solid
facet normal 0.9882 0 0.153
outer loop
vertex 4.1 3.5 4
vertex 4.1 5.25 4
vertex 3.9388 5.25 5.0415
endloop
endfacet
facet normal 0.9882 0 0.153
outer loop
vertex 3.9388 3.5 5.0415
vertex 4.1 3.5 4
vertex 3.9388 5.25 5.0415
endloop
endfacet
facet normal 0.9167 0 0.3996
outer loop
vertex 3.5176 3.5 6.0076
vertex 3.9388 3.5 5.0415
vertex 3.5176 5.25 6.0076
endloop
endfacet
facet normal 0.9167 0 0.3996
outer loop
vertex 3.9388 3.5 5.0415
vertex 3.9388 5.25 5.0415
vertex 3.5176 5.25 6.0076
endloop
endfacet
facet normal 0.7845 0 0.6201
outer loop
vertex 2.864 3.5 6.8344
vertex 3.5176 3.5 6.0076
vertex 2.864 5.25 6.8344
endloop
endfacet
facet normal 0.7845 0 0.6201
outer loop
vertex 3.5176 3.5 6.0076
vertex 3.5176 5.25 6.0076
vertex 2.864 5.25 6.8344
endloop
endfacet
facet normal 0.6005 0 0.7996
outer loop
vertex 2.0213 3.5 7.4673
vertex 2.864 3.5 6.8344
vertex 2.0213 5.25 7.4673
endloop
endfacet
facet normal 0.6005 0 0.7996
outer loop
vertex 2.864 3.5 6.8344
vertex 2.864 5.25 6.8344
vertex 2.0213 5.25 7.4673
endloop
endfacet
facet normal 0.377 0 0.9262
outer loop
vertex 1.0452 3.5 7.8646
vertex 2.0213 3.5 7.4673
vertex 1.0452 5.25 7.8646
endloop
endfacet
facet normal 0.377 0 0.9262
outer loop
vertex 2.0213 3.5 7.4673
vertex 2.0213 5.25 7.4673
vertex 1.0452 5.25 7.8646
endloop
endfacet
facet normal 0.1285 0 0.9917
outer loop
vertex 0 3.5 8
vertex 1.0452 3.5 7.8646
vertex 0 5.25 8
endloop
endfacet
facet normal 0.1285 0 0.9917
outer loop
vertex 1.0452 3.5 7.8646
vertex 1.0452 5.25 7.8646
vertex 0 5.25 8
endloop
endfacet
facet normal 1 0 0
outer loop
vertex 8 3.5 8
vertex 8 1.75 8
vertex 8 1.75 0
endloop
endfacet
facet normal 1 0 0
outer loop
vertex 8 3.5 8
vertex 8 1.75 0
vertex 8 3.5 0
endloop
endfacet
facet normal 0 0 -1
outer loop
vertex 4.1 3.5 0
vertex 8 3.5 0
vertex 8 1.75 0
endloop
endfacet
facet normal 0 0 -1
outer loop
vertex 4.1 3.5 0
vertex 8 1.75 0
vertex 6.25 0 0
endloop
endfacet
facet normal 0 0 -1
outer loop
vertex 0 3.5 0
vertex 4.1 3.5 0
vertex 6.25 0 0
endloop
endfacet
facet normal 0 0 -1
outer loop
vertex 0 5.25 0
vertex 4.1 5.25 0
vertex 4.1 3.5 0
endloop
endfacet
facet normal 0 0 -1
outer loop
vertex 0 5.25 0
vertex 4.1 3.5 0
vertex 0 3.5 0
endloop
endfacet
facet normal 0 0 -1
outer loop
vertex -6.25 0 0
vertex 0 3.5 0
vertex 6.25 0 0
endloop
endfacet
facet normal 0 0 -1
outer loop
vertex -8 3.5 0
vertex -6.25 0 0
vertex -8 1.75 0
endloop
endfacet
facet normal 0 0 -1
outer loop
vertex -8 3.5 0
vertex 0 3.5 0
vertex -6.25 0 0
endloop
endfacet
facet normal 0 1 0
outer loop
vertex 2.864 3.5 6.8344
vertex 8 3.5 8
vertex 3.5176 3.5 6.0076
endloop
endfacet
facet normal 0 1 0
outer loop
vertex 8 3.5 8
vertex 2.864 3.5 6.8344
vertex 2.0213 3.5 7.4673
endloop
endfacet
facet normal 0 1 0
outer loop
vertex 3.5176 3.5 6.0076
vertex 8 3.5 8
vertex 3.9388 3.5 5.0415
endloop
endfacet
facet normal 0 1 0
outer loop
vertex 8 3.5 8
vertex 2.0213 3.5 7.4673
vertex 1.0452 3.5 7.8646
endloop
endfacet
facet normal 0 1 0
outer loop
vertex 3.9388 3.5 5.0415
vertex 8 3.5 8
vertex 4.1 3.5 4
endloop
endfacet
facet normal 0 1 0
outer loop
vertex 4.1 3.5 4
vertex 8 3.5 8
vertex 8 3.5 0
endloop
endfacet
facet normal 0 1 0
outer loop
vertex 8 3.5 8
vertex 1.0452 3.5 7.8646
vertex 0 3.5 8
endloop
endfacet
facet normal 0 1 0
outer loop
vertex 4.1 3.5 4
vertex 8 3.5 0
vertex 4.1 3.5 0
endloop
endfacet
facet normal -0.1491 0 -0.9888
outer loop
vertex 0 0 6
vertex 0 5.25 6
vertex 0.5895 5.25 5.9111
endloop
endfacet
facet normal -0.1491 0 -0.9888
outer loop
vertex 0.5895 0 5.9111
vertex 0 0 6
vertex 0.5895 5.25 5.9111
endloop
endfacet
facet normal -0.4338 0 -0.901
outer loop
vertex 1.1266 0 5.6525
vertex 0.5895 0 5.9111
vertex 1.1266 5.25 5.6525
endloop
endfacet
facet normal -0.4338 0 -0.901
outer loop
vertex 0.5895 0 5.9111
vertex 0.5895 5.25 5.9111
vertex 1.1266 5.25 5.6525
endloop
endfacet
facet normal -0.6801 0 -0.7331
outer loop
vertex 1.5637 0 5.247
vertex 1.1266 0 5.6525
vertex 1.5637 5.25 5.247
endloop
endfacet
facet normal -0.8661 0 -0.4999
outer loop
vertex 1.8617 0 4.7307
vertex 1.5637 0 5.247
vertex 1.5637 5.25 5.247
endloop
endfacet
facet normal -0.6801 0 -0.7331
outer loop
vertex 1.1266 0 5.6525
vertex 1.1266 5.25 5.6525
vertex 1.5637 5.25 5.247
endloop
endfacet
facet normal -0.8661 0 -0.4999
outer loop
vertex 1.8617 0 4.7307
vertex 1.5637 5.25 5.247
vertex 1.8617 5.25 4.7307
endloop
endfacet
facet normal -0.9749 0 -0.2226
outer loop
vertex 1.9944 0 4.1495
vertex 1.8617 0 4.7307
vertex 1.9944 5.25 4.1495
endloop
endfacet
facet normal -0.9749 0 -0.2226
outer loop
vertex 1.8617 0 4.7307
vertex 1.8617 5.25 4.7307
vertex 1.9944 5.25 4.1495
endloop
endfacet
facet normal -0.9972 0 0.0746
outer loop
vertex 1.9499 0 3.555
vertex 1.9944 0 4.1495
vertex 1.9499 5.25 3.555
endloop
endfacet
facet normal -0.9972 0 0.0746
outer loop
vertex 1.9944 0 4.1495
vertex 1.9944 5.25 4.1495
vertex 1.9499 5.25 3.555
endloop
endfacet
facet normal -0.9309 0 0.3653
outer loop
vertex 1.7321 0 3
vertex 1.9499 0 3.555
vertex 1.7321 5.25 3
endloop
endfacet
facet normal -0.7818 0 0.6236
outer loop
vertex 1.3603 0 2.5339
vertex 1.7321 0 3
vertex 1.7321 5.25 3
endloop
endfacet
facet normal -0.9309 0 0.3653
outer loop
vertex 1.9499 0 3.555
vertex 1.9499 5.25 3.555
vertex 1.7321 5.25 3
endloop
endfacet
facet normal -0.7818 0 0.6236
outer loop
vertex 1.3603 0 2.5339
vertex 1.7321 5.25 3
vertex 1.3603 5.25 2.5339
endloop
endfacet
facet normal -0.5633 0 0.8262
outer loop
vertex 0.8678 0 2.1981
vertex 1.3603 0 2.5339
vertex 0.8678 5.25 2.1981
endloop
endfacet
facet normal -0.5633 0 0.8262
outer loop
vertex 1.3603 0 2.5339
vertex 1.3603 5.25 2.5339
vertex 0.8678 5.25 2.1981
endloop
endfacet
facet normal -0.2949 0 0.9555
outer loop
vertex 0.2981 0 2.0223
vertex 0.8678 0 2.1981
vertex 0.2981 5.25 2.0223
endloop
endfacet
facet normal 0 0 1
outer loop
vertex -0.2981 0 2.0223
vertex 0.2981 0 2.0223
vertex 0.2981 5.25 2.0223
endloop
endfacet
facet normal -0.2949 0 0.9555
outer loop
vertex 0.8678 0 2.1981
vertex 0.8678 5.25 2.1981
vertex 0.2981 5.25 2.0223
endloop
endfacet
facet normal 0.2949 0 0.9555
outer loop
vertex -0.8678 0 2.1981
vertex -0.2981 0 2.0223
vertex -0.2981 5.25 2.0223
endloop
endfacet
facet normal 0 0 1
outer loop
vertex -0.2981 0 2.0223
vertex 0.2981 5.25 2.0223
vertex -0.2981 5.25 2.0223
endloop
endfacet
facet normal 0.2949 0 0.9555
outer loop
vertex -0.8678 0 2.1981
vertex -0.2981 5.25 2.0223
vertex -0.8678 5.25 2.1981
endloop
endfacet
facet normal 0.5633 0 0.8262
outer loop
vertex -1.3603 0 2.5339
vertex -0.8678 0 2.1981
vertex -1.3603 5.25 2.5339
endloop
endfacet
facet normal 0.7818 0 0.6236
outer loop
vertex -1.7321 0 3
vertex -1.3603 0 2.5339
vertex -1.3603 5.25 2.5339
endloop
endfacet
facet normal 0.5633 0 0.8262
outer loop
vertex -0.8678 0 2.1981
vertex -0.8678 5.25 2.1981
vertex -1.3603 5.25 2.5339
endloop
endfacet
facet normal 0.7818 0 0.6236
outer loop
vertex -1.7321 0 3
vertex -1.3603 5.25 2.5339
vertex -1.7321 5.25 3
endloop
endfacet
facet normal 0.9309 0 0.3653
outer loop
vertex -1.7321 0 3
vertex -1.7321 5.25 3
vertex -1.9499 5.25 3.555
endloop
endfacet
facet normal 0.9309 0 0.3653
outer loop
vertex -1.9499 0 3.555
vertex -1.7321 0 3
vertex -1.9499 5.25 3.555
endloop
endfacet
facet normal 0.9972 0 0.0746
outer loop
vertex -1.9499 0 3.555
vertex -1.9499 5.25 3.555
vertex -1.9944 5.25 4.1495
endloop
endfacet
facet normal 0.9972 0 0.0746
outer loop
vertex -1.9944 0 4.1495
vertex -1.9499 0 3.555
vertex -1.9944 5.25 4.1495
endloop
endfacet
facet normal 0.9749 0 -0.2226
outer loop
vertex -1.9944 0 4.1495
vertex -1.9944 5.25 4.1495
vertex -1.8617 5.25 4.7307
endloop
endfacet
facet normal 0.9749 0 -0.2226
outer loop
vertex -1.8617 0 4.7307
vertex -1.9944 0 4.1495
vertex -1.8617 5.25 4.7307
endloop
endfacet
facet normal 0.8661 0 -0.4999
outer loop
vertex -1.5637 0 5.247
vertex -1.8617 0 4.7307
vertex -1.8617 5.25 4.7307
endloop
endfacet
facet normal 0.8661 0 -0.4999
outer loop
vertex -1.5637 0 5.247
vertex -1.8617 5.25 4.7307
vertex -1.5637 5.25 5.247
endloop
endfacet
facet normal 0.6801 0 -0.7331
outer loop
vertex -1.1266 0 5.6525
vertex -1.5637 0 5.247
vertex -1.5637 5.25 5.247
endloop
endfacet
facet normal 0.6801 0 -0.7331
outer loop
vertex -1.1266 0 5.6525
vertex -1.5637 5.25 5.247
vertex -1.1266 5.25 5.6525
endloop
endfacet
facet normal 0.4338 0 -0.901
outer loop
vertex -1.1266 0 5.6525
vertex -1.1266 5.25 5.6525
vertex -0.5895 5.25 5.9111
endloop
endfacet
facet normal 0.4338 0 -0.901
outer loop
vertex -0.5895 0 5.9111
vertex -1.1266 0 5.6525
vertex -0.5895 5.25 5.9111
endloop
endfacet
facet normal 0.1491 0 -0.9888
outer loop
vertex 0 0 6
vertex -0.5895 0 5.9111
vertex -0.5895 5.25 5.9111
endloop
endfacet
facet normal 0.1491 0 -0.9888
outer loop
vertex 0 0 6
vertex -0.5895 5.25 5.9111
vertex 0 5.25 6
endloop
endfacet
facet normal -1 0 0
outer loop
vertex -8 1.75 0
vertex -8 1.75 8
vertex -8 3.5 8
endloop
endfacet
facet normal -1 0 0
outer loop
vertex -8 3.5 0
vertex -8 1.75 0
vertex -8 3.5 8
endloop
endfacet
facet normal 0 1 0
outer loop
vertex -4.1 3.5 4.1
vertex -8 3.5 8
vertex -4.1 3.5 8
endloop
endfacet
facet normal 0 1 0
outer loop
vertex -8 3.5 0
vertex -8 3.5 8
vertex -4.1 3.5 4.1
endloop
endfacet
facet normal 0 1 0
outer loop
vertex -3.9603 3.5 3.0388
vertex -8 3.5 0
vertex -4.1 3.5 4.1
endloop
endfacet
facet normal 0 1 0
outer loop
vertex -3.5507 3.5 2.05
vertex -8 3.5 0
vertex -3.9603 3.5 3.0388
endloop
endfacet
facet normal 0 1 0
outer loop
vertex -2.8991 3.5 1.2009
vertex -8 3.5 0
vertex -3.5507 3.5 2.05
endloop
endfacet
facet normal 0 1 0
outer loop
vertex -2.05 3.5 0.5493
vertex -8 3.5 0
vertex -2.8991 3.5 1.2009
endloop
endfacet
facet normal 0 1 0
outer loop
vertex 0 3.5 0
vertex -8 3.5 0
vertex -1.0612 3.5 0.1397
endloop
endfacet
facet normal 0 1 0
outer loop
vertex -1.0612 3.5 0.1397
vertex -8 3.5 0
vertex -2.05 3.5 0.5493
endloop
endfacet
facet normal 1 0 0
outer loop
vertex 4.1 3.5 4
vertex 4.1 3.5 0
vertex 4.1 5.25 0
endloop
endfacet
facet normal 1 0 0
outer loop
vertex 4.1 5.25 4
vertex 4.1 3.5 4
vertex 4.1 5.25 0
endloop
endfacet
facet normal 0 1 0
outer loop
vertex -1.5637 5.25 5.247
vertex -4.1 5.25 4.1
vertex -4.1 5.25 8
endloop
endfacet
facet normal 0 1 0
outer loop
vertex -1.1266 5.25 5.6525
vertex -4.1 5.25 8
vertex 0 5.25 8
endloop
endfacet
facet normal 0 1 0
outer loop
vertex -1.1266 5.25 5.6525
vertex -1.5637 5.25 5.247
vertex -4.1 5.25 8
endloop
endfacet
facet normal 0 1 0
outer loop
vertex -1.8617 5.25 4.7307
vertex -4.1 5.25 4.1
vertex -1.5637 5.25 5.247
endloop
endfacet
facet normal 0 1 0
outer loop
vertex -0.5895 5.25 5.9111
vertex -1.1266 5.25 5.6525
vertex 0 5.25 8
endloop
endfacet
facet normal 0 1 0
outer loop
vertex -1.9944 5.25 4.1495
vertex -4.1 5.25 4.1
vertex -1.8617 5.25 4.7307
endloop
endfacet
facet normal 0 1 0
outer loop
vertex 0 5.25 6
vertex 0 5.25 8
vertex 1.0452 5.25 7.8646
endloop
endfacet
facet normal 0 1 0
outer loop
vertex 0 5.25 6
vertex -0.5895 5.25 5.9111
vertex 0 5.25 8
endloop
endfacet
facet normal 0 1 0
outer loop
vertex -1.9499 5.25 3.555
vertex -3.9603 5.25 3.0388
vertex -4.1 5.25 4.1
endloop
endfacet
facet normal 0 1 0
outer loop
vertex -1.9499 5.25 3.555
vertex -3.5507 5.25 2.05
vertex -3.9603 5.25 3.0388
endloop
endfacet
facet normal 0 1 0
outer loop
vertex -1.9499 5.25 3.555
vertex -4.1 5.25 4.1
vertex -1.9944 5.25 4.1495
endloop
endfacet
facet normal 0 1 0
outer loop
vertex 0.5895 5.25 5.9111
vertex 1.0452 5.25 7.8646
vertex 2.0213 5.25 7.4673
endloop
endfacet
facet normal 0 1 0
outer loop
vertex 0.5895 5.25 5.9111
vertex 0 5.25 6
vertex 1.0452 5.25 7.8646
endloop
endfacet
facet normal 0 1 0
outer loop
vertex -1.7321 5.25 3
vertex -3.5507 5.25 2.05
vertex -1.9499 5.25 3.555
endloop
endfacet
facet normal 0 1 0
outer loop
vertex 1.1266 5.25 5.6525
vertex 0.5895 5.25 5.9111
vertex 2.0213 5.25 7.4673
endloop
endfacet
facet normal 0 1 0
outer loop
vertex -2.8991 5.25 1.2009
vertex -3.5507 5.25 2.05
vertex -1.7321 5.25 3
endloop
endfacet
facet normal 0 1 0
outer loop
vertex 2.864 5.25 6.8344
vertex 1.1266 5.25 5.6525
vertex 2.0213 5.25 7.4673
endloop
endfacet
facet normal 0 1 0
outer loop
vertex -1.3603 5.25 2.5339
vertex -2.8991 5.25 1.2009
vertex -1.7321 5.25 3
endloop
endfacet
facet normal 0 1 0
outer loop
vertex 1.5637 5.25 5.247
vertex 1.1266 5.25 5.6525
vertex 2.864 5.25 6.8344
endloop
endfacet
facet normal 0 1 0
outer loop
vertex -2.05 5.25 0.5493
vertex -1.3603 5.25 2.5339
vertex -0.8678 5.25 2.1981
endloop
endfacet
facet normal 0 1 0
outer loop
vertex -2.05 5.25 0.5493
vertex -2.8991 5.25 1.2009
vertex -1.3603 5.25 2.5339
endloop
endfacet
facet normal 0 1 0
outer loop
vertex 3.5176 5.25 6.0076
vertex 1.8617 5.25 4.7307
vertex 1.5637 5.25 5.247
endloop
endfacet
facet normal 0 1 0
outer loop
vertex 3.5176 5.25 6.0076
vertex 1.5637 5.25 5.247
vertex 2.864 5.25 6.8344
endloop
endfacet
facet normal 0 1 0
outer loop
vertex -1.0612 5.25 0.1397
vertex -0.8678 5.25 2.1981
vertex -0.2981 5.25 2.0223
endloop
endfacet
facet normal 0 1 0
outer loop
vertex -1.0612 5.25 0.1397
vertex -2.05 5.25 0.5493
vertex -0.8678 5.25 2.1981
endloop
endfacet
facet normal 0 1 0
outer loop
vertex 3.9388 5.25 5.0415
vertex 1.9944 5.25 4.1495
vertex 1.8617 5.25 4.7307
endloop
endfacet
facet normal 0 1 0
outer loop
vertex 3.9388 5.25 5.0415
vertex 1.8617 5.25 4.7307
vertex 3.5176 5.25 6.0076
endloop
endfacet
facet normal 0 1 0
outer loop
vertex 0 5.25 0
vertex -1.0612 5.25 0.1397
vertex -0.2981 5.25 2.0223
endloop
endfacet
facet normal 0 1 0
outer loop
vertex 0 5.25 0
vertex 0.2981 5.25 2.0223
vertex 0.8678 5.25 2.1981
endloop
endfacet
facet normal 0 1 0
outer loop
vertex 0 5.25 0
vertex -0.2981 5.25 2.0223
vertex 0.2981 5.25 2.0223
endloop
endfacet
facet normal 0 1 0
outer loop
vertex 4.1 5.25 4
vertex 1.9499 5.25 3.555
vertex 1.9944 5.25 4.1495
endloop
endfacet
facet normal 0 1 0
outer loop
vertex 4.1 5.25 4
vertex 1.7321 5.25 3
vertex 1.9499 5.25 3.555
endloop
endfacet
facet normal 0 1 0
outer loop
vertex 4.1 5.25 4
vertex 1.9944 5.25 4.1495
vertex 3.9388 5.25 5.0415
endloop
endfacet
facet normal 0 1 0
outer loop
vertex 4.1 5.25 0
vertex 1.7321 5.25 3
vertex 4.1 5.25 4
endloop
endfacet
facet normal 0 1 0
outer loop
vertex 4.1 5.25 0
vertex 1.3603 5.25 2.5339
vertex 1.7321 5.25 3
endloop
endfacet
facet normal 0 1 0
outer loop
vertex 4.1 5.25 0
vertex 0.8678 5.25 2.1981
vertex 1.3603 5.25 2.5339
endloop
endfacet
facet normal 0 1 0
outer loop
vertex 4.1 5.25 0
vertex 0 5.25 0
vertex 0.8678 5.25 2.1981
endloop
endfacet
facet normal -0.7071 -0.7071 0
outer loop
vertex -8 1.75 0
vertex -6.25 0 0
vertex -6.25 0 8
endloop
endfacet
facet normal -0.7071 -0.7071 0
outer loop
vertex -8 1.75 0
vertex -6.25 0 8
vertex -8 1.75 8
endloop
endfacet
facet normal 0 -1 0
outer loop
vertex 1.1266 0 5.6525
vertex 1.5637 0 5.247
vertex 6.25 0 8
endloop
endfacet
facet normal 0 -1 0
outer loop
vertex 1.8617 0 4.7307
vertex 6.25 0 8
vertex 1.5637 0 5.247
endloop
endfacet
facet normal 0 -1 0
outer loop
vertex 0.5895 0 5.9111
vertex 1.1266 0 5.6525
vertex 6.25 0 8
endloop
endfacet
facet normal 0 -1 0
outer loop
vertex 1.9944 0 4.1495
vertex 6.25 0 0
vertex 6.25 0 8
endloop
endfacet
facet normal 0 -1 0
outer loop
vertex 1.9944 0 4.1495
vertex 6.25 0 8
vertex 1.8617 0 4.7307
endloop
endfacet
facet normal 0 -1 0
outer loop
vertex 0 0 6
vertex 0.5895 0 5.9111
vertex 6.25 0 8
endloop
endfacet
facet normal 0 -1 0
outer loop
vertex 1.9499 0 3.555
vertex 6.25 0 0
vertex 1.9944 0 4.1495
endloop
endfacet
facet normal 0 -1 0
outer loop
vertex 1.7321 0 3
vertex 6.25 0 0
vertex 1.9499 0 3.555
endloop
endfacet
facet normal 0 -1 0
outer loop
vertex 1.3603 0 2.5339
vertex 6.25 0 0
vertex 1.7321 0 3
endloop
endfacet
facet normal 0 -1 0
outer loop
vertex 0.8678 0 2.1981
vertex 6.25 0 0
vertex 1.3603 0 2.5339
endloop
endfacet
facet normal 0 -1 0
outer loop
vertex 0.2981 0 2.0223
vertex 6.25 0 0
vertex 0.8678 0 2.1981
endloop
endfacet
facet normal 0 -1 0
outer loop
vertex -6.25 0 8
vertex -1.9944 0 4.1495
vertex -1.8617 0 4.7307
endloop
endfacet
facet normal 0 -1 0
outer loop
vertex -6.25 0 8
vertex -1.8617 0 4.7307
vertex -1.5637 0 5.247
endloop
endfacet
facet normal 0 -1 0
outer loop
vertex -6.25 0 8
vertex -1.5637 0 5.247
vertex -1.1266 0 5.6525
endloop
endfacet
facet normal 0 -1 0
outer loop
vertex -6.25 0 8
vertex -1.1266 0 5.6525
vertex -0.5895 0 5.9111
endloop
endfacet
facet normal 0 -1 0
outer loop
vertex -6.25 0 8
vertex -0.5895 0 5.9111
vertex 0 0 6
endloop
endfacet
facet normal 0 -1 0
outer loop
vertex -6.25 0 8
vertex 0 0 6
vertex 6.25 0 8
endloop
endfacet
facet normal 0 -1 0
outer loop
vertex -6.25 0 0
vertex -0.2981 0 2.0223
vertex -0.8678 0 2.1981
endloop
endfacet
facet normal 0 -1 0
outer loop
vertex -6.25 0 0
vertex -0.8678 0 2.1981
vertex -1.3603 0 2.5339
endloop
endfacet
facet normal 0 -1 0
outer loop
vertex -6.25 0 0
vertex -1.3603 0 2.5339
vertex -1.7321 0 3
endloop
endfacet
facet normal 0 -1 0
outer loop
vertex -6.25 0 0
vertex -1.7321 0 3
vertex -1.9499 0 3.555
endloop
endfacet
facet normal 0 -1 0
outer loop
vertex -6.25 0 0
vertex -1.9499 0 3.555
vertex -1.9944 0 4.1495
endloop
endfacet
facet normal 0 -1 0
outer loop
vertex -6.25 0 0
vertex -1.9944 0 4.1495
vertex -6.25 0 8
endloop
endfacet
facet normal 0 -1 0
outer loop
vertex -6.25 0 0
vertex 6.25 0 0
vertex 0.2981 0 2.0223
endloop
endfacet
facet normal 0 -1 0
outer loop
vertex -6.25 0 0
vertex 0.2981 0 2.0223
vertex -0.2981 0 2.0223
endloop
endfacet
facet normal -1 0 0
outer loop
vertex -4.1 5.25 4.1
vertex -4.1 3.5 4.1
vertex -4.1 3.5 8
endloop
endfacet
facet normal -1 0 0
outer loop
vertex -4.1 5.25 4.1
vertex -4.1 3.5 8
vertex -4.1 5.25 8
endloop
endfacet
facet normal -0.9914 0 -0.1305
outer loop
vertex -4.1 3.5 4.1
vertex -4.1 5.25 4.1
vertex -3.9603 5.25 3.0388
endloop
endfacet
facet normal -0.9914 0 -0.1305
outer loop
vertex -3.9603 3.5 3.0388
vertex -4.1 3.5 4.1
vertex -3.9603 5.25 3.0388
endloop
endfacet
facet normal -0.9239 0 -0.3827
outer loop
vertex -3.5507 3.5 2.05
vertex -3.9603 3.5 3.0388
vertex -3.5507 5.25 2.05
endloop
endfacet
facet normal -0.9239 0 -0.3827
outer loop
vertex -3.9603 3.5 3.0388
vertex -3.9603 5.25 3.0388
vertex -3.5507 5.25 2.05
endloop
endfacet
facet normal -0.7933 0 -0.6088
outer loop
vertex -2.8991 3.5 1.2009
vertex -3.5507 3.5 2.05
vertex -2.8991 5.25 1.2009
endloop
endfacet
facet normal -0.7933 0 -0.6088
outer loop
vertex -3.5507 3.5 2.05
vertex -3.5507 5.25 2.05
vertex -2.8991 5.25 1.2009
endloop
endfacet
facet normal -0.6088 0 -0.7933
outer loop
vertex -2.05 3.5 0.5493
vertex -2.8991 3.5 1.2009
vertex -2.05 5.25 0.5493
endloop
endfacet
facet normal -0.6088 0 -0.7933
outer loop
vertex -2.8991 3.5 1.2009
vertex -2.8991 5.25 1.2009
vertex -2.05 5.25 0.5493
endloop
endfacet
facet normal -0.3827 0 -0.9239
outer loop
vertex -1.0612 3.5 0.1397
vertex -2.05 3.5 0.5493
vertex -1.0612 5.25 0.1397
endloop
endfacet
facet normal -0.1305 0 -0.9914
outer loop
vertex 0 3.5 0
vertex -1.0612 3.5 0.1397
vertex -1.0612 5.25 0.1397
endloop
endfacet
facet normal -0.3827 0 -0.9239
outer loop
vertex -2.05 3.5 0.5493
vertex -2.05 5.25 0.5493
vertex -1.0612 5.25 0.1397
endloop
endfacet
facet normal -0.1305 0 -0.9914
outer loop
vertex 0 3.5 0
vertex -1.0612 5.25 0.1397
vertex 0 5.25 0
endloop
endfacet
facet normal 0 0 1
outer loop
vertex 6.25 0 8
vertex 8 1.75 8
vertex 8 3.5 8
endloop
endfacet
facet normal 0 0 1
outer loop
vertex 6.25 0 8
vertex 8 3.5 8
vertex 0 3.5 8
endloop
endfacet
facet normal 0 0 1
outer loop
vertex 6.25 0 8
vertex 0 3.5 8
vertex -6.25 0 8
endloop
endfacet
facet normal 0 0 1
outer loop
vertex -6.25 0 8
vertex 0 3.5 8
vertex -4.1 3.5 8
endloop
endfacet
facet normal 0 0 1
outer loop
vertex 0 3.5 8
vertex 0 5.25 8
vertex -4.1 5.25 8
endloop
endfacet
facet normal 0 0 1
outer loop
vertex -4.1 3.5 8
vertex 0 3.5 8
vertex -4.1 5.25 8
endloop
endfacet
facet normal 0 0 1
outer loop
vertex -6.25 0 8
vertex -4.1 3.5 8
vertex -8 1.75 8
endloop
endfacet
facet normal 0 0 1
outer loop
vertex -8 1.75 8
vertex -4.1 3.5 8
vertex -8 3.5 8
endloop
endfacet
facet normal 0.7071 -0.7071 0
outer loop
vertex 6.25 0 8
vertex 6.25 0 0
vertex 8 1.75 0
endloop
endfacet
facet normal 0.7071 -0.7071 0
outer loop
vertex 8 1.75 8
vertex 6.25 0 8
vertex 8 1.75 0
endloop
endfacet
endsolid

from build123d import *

# Parameters (mm, degrees)
BOSS_EXTRUDE1_DEPTH = 8
SKETCH2_R           = 2
CUT_EXTRUDE1_DEPTH  = 8
CUT_EXTRUDE2_DEPTH  = 1.75


with BuildPart() as part:
    # Sketch1 → Boss-Extrude1 (new body)
    with BuildSketch(Plane.XY):
        Polygon((0, 5.25), (0, 0), (6.25, 0), (8, 1.75), (8, 3.5), (4.1, 3.5), (4.1, 5.25), align=None)
    extrude(amount=BOSS_EXTRUDE1_DEPTH)

    # Mirror1: part across plane


with BuildPart() as part_1:
    add(part.part)
    add(part.part.mirror(Plane(origin=(0, 0, 0), x_dir=(0, 0, 1), z_dir=(1, 0, 0))))

    # Sketch2 → Cut-Extrude1 (cut)
    with BuildSketch(Plane(origin=(0, 5.25, 0), x_dir=(1, 0, 0), z_dir=(0, 1, 0))):
        with Locations(Location((0, -4, 0), (0, 0, 270))):
            Circle(SKETCH2_R)
    extrude(amount=-CUT_EXTRUDE1_DEPTH, mode=Mode.SUBTRACT)

    # Sketch3 → Cut-Extrude2 (cut)
    with BuildSketch(Plane(origin=(0, 5.25, 0), x_dir=(1, 0, 0), z_dir=(0, 1, 0))):
        with BuildLine():
            ThreePointArc((4.1, -4), (2.864000698, -6.834350716), (0, -8))
            Line((0, -8), (4.1, -8))
            Line((4.1, -8), (4.1, -4))
        make_face()
        with BuildLine():
            Line((-4.1, 0), (-4.1, -4.1))
            ThreePointArc((-4.1, -4.1), (-2.899137803, -1.200862197), (0, 0))
            Line((0, 0), (-4.1, 0))
        make_face()
    extrude(amount=-CUT_EXTRUDE2_DEPTH, mode=Mode.SUBTRACT)


solid = part_1.part
